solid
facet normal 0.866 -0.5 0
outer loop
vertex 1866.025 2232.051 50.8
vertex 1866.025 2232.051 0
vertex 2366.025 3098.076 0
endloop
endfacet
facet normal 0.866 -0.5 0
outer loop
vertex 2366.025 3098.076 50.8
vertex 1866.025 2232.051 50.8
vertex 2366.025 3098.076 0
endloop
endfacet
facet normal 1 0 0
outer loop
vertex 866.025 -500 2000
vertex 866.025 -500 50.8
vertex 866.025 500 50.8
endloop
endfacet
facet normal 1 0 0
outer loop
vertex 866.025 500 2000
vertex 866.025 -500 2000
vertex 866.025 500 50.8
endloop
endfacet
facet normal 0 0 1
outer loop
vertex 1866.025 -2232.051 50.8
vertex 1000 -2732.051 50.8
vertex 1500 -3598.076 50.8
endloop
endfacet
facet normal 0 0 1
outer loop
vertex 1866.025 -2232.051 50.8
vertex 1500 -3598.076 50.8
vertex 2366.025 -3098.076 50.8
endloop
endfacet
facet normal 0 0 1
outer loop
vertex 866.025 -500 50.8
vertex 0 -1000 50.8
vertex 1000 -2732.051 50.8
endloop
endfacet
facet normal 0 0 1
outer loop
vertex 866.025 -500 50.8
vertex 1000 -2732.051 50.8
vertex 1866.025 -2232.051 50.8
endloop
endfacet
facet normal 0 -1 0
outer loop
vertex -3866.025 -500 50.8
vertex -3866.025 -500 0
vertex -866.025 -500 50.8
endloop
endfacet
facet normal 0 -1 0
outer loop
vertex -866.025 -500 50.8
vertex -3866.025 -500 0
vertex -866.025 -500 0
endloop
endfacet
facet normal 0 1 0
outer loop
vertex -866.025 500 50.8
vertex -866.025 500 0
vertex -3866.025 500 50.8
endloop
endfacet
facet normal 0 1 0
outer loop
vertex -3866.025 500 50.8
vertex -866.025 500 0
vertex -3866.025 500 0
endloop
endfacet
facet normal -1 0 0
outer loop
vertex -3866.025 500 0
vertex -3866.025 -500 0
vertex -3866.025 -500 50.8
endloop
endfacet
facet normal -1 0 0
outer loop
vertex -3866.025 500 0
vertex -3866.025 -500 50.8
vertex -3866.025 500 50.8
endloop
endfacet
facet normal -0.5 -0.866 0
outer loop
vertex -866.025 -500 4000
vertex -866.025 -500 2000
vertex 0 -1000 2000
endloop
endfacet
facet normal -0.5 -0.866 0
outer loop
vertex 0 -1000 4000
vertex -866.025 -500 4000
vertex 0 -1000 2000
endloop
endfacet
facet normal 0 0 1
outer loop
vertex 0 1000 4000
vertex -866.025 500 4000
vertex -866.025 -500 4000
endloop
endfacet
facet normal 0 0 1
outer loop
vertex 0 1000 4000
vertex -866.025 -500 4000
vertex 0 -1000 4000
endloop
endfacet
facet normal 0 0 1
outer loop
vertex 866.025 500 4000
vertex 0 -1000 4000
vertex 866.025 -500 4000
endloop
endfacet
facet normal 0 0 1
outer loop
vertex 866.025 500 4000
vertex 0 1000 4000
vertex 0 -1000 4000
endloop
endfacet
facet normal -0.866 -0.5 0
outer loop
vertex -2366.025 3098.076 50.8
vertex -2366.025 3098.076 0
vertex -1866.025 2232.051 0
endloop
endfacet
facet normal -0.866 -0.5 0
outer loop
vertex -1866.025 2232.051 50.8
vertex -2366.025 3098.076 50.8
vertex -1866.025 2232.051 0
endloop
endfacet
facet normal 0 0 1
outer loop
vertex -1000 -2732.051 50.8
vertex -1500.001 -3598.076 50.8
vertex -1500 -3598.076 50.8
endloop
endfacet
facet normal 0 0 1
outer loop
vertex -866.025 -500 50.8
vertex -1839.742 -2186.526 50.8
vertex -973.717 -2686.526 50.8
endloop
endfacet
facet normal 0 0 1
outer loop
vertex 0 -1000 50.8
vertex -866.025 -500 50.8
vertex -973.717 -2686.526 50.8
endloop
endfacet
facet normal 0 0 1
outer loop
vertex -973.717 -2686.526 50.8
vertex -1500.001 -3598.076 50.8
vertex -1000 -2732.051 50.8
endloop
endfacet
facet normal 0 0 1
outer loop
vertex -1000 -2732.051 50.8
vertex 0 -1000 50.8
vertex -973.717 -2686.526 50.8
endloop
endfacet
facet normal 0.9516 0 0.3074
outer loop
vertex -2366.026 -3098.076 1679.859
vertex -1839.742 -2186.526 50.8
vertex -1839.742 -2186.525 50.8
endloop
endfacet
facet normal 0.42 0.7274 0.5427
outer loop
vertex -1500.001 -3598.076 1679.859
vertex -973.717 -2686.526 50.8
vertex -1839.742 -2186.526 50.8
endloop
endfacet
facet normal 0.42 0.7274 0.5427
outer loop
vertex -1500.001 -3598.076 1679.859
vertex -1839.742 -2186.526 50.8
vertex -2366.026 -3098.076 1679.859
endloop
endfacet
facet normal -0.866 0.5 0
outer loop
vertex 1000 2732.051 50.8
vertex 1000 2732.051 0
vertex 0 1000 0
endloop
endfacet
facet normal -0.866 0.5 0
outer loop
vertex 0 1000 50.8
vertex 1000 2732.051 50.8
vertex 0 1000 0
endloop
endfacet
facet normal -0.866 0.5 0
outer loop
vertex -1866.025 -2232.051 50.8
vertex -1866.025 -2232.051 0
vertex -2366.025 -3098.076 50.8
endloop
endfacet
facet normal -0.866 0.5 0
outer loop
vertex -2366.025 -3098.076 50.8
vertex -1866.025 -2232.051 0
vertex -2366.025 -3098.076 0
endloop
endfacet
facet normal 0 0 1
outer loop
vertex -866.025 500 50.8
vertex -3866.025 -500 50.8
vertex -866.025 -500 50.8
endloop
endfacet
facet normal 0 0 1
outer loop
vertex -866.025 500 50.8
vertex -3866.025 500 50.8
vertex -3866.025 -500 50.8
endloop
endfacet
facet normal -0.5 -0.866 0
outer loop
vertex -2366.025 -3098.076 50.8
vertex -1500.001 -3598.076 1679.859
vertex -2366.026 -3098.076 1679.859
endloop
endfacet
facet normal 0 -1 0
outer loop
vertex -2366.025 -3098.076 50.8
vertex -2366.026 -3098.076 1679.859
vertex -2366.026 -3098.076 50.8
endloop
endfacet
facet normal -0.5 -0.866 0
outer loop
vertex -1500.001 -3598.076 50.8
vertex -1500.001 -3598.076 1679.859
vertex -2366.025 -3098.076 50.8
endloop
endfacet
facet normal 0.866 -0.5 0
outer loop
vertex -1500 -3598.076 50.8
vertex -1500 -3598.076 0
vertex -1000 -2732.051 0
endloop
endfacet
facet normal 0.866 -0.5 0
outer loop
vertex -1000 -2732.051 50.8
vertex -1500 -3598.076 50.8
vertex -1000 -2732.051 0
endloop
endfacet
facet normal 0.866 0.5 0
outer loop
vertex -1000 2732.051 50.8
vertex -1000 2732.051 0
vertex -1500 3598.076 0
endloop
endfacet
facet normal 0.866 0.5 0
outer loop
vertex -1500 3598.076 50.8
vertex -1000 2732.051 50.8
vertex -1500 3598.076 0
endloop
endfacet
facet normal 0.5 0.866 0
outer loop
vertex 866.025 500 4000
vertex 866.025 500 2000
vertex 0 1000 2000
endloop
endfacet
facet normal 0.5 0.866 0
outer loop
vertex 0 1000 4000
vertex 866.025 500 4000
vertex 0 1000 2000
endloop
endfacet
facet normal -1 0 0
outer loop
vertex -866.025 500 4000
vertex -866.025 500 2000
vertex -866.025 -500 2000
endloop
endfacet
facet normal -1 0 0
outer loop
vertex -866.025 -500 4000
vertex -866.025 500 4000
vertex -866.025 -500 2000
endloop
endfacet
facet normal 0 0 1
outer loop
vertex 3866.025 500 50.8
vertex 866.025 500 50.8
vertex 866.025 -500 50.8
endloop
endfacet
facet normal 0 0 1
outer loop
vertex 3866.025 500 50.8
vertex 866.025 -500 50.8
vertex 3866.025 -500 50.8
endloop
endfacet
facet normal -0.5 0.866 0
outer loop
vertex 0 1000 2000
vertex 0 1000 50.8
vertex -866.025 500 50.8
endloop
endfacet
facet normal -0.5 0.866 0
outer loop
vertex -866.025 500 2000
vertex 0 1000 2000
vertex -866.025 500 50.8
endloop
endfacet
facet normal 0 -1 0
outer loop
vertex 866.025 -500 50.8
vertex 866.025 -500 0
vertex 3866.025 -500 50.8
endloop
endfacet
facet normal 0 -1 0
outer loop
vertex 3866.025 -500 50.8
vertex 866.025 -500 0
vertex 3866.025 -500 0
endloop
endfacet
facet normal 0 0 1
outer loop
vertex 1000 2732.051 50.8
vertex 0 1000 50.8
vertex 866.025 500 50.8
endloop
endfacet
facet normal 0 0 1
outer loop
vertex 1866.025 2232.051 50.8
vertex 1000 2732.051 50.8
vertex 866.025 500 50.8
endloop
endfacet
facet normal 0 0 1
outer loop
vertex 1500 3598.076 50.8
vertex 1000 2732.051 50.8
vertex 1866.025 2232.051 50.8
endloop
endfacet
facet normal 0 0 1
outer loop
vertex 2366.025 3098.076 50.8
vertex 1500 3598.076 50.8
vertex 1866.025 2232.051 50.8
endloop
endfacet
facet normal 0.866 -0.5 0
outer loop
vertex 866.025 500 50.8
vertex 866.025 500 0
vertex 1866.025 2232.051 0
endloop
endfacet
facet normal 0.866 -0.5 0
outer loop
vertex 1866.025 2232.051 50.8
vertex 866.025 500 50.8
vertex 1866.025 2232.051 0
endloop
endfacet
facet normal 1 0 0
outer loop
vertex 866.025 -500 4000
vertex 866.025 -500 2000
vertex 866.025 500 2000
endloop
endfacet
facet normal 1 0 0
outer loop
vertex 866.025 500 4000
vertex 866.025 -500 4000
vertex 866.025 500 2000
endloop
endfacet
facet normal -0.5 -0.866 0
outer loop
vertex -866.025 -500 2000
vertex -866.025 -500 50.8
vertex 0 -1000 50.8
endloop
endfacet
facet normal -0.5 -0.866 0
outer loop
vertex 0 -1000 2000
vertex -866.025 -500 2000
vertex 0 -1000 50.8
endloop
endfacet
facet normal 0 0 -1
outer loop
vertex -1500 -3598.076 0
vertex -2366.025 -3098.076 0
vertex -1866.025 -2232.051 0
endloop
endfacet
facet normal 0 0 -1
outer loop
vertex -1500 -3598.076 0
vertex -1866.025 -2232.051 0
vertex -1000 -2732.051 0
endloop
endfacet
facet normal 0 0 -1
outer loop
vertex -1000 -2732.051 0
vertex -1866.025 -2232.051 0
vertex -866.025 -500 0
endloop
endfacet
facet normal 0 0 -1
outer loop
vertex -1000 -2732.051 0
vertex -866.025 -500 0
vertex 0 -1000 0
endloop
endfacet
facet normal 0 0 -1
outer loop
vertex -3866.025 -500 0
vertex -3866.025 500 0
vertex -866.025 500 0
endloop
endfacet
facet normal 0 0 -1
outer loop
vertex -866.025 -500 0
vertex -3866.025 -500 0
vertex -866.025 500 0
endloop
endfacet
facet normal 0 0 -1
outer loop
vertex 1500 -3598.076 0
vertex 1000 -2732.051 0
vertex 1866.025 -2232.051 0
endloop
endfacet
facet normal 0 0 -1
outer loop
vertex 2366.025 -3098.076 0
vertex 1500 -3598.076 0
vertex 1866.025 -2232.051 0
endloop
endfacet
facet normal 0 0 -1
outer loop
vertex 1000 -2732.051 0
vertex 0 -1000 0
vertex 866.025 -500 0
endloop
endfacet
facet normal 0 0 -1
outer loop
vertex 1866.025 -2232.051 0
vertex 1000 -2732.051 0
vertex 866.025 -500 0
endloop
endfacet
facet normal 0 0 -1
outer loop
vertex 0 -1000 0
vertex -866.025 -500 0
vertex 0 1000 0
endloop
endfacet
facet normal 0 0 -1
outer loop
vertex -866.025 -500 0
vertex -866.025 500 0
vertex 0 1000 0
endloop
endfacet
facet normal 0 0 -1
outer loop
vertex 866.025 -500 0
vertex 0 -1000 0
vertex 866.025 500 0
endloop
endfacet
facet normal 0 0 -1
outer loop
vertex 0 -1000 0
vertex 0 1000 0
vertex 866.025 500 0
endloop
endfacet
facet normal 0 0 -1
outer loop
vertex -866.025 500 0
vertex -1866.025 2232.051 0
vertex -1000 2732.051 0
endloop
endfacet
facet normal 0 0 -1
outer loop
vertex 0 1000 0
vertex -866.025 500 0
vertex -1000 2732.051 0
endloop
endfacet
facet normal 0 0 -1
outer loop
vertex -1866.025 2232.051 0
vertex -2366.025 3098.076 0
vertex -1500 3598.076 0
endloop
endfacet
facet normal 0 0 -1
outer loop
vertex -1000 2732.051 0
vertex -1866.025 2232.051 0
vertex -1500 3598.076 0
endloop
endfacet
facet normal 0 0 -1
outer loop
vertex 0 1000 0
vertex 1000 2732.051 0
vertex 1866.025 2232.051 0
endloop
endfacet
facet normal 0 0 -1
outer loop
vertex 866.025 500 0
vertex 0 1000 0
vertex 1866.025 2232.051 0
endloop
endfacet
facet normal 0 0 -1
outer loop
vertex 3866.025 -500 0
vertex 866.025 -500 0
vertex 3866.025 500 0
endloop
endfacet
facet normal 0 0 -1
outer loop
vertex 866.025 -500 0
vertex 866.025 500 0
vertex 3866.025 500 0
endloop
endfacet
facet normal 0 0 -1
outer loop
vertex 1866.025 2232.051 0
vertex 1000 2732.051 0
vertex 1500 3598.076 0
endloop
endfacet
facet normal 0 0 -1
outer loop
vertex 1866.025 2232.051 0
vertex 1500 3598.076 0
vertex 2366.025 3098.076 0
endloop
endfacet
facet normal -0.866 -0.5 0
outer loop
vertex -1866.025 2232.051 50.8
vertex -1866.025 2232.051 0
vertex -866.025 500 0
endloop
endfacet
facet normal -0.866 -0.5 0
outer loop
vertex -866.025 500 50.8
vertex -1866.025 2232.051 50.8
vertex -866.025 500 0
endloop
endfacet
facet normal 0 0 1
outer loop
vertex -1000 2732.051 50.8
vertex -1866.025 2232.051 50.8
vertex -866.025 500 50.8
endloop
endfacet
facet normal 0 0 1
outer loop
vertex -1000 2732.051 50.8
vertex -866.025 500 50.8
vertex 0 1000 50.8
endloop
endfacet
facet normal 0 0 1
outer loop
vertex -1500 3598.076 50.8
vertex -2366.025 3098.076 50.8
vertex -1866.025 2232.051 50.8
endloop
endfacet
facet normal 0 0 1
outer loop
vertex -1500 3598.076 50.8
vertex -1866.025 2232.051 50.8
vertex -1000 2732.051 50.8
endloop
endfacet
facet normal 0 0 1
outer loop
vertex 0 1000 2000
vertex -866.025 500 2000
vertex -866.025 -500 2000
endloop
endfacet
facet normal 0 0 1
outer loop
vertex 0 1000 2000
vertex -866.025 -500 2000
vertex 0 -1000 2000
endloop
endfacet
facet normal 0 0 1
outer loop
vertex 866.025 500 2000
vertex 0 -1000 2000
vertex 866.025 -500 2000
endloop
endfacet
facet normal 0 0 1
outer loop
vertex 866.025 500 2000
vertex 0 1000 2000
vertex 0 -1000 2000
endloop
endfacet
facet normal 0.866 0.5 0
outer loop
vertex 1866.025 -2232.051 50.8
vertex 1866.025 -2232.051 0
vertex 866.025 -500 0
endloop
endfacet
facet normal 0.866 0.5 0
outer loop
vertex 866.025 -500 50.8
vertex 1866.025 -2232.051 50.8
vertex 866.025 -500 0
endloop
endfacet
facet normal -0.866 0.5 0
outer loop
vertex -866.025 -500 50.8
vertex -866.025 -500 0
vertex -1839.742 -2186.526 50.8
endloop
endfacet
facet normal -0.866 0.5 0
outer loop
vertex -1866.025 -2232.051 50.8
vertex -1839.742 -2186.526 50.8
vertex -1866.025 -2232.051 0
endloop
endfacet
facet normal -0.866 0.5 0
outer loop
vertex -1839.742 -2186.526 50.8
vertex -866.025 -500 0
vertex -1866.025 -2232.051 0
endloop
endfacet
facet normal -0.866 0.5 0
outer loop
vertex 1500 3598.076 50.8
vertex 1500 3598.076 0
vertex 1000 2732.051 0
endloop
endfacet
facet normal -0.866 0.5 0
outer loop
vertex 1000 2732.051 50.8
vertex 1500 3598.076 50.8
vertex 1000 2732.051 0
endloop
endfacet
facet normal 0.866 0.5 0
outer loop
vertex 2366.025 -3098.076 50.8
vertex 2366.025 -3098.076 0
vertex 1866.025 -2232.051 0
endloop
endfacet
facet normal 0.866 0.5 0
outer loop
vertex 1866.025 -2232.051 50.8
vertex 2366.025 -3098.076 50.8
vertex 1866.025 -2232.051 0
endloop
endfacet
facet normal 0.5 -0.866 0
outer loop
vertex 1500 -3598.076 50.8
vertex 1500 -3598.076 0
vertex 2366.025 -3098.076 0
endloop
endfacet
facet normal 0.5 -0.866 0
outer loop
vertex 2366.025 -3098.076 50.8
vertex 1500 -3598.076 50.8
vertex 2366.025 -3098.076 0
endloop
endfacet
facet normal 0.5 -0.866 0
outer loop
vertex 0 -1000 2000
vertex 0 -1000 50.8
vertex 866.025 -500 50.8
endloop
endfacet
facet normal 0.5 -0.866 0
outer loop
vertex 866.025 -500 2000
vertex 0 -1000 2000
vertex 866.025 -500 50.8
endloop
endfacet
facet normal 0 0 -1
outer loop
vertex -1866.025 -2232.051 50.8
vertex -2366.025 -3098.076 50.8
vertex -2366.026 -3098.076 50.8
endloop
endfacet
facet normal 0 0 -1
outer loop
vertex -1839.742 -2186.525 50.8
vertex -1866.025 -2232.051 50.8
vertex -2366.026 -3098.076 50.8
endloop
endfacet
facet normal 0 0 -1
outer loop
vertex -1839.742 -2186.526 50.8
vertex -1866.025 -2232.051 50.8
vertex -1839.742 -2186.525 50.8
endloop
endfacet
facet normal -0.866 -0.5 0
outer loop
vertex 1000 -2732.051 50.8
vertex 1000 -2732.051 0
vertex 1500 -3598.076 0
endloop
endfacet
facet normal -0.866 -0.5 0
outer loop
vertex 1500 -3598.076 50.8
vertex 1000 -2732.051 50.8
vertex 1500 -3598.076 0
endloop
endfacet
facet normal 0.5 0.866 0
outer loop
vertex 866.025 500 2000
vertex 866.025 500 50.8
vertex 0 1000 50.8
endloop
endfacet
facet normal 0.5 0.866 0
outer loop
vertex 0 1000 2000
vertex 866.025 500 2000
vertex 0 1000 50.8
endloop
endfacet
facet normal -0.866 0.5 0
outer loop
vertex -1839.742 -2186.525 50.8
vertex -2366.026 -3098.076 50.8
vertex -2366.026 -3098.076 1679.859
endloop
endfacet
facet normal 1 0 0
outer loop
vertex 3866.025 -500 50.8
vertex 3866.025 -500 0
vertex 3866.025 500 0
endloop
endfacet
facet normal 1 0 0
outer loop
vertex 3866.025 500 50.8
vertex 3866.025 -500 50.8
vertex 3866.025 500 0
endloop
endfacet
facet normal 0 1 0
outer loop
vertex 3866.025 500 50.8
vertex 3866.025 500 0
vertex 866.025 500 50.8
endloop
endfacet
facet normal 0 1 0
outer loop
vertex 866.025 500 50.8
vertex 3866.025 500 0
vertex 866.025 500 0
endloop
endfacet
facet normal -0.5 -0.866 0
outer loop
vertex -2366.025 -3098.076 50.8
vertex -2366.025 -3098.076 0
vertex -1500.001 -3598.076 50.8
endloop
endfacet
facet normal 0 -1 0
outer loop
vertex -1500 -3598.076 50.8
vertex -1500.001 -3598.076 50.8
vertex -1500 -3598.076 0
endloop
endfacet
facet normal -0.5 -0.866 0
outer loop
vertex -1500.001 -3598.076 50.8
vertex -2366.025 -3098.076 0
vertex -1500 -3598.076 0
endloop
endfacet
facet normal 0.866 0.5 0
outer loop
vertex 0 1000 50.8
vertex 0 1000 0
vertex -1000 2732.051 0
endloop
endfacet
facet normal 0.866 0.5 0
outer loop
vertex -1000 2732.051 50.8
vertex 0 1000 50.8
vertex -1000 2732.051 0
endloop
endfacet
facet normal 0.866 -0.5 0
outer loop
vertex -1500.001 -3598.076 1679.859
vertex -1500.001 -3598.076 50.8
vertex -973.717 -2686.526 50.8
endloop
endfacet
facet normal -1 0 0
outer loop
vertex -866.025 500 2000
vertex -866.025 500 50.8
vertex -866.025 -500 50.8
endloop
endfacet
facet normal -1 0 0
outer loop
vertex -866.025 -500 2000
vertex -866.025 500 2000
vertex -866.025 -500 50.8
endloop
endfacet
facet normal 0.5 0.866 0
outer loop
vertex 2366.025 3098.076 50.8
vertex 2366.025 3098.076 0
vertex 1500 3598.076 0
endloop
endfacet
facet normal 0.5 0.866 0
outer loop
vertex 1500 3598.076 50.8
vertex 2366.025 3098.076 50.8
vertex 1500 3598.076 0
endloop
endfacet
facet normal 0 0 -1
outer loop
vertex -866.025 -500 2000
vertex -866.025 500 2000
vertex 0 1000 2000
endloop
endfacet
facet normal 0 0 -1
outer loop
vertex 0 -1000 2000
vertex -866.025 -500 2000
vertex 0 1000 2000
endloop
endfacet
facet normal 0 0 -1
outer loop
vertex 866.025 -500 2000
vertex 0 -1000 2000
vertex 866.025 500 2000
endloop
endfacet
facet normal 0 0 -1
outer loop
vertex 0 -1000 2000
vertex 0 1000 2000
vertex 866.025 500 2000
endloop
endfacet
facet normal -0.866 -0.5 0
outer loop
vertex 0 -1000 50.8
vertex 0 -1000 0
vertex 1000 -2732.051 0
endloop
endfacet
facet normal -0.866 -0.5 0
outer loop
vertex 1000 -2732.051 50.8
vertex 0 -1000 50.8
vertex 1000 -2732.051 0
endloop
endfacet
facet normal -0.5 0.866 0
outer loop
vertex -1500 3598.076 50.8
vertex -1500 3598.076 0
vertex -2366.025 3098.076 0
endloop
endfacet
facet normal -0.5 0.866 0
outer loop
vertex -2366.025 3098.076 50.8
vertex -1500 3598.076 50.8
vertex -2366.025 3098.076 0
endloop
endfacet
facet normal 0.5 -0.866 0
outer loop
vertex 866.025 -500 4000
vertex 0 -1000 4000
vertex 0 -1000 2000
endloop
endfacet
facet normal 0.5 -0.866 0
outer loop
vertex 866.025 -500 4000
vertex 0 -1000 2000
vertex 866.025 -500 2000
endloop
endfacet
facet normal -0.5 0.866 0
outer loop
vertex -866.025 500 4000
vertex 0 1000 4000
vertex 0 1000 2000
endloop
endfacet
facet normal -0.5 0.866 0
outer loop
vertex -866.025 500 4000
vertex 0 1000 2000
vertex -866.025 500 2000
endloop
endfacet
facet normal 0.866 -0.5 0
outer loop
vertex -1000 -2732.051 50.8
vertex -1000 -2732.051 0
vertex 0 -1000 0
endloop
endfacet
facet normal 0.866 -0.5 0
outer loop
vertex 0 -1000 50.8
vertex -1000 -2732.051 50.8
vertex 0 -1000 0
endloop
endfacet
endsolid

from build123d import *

# Parameters (mm, degrees)
F1_DEPTH = 2000
F0_W     = 2000
F0_H     = 1000
F0_W_2   = 1000
F2_DEPTH = 50.8
F3_DEPTH = 2000
F5_DEPTH = 1000


with BuildPart() as f1:
    # F0 (on Top) → F1 (new body)
    with BuildSketch(Plane.XY):
        Polygon((-866.025404, 500), (-866.025404, -500), (-433.012702, -750), (0, -1000), (866.025404, -500), (866.025404, 500), (0, 1000), align=None)
    extrude(amount=F1_DEPTH)

    # F0 (on Top) → F2 (join)
    with BuildSketch(Plane.XY):
        with Locations((-1866.025404, 0)):
            Rectangle(F0_W, F0_H)
        Polygon((-866.025404, 500), (-866.025404, -500), (-433.012702, -750), (0, -1000), (866.025404, -500), (866.025404, 500), (0, 1000), align=None)
        Polygon((-433.012702, -750), (-866.025404, -500), (-1866.025404, -2232.050808), (-1433.012702, -2482.050808), align=None)
        Polygon((-1866.025404, 2232.050808), (-866.025404, 500), (0, 1000), (-1000, 2732.050808), align=None)
        Polygon((0, -1000), (-433.012702, -750), (-1433.012702, -2482.050808), (-1000, -2732.050808), align=None)
        with Locations((-3366.025404, 0)):
            Rectangle(F0_W_2, F0_H)
        Polygon((-1433.012702, -2482.050808), (-1866.025404, -2232.050808), (-2366.025404, -3098.076211), (-1933.012702, -3348.076211), align=None)
        Polygon((1000, 2732.050808), (0, 1000), (866.025404, 500), (1866.025404, 2232.050808), align=None)
        Polygon((-2366.025404, 3098.076211), (-1866.025404, 2232.050808), (-1000, 2732.050808), (-1500, 3598.076211), align=None)
        Polygon((866.025404, -500), (0, -1000), (1000, -2732.050808), (1866.025404, -2232.050808), align=None)
        Polygon((-1000, -2732.050808), (-1433.012702, -2482.050808), (-1933.012702, -3348.076211), (-1500, -3598.076211), align=None)
        with Locations((1866.025404, 0)):
            Rectangle(F0_W, F0_H)
        Polygon((1500, 3598.076211), (1000, 2732.050808), (1866.025404, 2232.050808), (2366.025404, 3098.076211), align=None)
        Polygon((1866.025404, -2232.050808), (1000, -2732.050808), (1500, -3598.076211), (2366.025404, -3098.076211), align=None)
        with Locations((3366.025404, 0)):
            Rectangle(F0_W_2, F0_H)
    extrude(amount=F2_DEPTH)

    # F4 (on face) → F5 (join)
    with BuildSketch(Plane(origin=(433.012702, -250, 0), x_dir=(0.5, 0.866025, 0), z_dir=(0.866025, -0.5, 0))):
        Polygon((-3866.025404, 1679.859365), (-3866.025404, 50.8), (-2813.457804, 50.8), align=None)
    extrude(amount=-F5_DEPTH)


with BuildPart() as f3:
    # F1_face (on face) → F3 (new body)
    with BuildSketch(Plane.XY.offset(2000)):
        Polygon((-866.025404, 500), (-866.025404, -500), (0, -1000), (866.025404, -500), (866.025404, 500), (0, 1000), align=None)
    extrude(amount=F3_DEPTH)


solid = Compound([f1.part, f3.part])
